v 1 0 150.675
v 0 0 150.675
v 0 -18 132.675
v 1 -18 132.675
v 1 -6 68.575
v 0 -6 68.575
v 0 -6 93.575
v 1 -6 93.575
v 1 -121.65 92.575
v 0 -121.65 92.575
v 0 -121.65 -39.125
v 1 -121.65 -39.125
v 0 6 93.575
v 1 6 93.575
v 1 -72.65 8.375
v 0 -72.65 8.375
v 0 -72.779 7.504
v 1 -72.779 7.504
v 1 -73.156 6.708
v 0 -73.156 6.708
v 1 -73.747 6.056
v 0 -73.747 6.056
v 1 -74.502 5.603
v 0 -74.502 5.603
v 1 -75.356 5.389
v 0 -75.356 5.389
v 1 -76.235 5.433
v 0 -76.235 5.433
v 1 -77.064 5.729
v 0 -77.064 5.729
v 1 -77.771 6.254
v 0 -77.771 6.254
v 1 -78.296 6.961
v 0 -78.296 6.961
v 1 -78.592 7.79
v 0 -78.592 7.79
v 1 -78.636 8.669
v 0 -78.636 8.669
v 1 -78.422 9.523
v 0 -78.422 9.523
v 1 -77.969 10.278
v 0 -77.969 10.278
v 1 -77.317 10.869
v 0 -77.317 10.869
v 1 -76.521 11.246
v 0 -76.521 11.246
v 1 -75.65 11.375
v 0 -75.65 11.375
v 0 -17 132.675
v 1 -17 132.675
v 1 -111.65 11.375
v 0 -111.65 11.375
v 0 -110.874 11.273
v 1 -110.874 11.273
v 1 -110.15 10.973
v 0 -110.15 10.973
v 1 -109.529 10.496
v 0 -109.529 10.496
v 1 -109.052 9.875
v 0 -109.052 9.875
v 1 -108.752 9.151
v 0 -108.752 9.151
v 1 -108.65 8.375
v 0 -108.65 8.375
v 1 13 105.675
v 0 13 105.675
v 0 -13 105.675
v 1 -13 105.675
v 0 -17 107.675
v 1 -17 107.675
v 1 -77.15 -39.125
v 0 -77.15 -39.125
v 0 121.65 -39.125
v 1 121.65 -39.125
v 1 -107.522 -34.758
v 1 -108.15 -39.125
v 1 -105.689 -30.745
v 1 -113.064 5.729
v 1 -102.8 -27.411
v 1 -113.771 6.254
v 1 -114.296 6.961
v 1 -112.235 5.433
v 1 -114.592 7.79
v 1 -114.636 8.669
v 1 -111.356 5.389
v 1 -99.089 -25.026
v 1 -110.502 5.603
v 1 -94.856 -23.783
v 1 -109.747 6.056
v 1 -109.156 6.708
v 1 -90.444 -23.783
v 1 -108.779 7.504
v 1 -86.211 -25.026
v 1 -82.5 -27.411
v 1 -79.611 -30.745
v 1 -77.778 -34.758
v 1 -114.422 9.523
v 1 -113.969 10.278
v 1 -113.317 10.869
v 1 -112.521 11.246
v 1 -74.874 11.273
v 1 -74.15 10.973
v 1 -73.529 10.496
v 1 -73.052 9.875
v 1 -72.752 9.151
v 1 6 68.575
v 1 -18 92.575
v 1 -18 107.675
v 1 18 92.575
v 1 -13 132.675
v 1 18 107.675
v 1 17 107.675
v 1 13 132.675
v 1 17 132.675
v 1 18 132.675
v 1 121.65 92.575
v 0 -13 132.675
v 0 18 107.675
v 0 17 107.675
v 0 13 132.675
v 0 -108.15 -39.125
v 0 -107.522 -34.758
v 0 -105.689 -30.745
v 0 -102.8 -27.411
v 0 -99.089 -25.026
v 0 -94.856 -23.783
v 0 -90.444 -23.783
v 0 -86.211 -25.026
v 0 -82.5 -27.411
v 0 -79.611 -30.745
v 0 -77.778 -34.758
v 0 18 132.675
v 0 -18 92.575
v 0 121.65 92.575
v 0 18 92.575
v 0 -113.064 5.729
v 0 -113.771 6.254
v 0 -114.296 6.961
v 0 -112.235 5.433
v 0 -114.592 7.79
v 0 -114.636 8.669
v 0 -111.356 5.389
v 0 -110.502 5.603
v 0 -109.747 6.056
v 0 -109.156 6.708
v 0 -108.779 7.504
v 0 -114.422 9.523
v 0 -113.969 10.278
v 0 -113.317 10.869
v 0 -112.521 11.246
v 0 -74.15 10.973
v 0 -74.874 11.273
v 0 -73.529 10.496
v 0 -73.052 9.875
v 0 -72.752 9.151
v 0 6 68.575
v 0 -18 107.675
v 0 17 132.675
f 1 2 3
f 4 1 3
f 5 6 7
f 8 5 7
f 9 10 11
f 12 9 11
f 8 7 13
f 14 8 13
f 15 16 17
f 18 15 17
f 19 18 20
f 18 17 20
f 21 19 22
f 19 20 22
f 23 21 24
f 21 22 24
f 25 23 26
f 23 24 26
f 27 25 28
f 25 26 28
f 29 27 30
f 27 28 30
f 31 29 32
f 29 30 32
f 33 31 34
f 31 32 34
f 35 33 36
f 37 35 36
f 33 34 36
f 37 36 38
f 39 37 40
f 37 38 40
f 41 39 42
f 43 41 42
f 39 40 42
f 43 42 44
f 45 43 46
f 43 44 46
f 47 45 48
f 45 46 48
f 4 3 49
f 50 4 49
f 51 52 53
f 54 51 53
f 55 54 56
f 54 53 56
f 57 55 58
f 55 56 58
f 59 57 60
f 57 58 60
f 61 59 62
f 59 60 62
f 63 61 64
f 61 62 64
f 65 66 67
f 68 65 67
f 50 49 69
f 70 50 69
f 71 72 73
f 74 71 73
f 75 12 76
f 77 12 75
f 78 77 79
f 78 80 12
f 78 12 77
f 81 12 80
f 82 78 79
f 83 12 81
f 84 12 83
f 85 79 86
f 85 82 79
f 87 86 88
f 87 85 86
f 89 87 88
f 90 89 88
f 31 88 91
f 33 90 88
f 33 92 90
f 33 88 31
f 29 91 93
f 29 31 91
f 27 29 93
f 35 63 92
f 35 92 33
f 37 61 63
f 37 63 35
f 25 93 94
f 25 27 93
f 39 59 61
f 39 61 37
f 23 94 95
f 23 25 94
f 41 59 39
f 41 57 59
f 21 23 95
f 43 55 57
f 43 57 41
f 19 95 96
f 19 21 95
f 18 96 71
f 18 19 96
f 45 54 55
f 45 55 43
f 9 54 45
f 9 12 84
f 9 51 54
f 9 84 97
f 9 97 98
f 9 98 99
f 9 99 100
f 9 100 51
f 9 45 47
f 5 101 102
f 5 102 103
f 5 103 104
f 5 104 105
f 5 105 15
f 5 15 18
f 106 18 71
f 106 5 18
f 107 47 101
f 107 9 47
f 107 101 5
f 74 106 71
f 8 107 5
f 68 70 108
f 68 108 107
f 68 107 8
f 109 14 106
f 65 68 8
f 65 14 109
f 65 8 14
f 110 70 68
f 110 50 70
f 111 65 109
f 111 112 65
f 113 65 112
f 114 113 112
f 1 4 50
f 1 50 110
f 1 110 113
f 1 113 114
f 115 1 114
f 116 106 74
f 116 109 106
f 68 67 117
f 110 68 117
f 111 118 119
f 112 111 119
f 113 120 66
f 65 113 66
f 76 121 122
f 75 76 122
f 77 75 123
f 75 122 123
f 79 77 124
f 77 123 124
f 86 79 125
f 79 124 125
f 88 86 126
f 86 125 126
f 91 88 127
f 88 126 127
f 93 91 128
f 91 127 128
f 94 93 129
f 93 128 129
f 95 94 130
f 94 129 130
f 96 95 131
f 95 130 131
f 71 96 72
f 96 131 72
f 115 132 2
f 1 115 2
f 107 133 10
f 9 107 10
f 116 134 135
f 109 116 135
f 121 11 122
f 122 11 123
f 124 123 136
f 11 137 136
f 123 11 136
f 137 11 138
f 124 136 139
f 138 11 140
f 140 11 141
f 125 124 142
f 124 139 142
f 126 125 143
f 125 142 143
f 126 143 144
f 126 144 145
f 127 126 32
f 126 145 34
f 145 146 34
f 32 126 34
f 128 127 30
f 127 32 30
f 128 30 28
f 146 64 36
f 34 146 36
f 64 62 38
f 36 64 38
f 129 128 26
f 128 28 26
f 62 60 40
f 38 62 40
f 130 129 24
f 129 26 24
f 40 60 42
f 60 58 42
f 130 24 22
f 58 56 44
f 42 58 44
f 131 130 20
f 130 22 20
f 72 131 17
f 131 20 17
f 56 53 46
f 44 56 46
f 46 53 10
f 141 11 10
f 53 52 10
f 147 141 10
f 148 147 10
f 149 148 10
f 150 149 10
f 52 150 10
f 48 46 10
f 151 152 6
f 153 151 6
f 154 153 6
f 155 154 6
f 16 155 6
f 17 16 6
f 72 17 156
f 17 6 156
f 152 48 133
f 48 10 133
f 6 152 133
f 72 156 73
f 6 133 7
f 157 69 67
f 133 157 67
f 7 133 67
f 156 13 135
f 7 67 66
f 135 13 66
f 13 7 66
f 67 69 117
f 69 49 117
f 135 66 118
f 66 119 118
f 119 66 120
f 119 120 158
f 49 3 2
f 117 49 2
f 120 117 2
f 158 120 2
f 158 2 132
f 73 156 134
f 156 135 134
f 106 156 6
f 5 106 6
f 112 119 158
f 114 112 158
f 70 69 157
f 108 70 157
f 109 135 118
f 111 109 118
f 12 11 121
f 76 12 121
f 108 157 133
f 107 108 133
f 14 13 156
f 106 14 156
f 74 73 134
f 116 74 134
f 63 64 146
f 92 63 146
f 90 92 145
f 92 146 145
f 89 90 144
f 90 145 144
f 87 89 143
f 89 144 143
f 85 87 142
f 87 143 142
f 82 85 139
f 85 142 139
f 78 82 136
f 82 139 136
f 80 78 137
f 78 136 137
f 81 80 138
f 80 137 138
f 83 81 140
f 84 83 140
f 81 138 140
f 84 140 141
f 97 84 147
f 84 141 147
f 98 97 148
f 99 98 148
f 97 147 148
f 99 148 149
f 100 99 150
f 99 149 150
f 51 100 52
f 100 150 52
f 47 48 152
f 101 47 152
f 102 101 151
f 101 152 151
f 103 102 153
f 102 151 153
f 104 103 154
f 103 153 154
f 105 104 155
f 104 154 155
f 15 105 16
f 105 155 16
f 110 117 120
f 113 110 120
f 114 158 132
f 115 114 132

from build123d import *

# Parameters (mm, degrees)
F0_W     = 19.65
F0_H     = 1.5
F1_DEPTH = 1


# Not quite as in the source:
# - a feature names something its author has since deleted; it is built from what else it names


with BuildPart() as f1:
    # F0 (on Right) → F1 (new body)
    with BuildSketch(Plane.YZ):
        Polygon((121.65, -16.375), (19.65, -16.375), (-19.65, -16.375), (-61.65, -16.375), (-61.65, -39.125), (121.65, -39.125), align=None)
        Polygon((-19.65, -16.375), (19.65, -16.375), (19.65, 14.875), (0, 14.875), (-19.65, 14.875), align=None)
        Polygon((19.65, 14.875), (19.65, -16.375), (121.65, -16.375), (121.65, 16.375), (19.65, 16.375), align=None)
        Polygon((-61.65, -16.375), (-19.65, -16.375), (-19.65, 14.875), (-19.65, 16.375), (-19.65, 57.475), (-19.65, 92.575), (-121.65, 92.575), (-121.65, 89.375), (-121.65, 16.375), (-111.65, 16.375), (-75.65, 16.375), (-61.65, 16.375), align=None)
        with Locations((9.825, 15.625)):
            Rectangle(F0_W, F0_H)
        with Locations((-9.825, 15.625)):
            Rectangle(F0_W, F0_H)
        with BuildLine():
            Line((-61.65, -39.125), (-61.65, -16.375))
            Line((-61.65, -16.375), (-121.65, -16.375))
            Line((-121.65, -16.375), (-121.65, -39.125))
            Line((-121.65, -39.125), (-111.65, -39.125))
            ThreePointArc((-111.65, -39.125), (-92.65, -20.125), (-73.65, -39.125))
            Line((-73.65, -39.125), (-61.65, -39.125))
        make_face()
        Polygon((-121.65, -16.375), (-61.65, -16.375), (-61.65, 16.375), (-75.65, 16.375), (-111.65, 16.375), (-121.65, 16.375), align=None)
        with BuildLine():
            ThreePointArc((-108.65, 8.375), (-113.7713203436, 6.2536796564), (-111.65, 11.375))
            ThreePointArc((-111.65, 11.375), (-109.5286796564, 10.4963203436), (-108.65, 8.375))
        make_face(mode=Mode.SUBTRACT)
        with BuildLine():
            ThreePointArc((-72.65, 8.375), (-77.7713203436, 6.2536796564), (-75.65, 11.375))
            ThreePointArc((-75.65, 11.375), (-73.5286796564, 10.4963203436), (-72.65, 8.375))
        make_face(mode=Mode.SUBTRACT)
        Polygon((19.65, 57.475), (19.65, 16.375), (121.65, 16.375), (121.65, 89.375), (121.65, 92.575), (19.65, 92.575), align=None)
        Polygon((0, 16.375), (19.65, 16.375), (19.65, 57.475), (6, 57.475), (6, 29.475), (0, 29.475), align=None)
        Polygon((-19.65, 57.475), (-19.65, 16.375), (0, 16.375), (0, 29.475), (-6, 29.475), (-6, 57.475), align=None)
        Polygon((6, 57.475), (19.65, 57.475), (19.65, 92.575), (18, 92.575), (18, 105.675), (18, 107.675), (17, 107.675), (17, 132.675), (18, 132.675), (0, 150.675), (0, 132.675), (13, 132.675), (13, 105.675), (0, 105.675), (0, 93.575), (6, 93.575), (6, 92.575), (6, 89.375), (6, 70.575), (6, 68.575), align=None)
        Polygon((-19.65, 92.575), (-19.65, 57.475), (-6, 57.475), (-6, 29.475), (0, 29.475), (6, 29.475), (6, 57.475), (6, 68.575), (-6, 68.575), (-6, 70.575), (-6, 92.575), (-6, 93.575), (0, 93.575), (0, 105.675), (-13, 105.675), (-13, 132.675), (0, 132.675), (0, 150.675), (-18, 132.675), (-17, 132.675), (-17, 107.675), (-18, 107.675), (-18, 105.675), (-18, 92.575), align=None)
        with BuildLine():
            Line((-77.15, -39.125), (-73.65, -39.125))
            ThreePointArc((-73.65, -39.125), (-92.65, -20.125), (-111.65, -39.125))
            Line((-111.65, -39.125), (-108.15, -39.125))
            ThreePointArc((-108.15, -39.125), (-92.65, -23.625), (-77.15, -39.125))
        make_face()
    extrude(amount=F1_DEPTH)


solid = f1.part
